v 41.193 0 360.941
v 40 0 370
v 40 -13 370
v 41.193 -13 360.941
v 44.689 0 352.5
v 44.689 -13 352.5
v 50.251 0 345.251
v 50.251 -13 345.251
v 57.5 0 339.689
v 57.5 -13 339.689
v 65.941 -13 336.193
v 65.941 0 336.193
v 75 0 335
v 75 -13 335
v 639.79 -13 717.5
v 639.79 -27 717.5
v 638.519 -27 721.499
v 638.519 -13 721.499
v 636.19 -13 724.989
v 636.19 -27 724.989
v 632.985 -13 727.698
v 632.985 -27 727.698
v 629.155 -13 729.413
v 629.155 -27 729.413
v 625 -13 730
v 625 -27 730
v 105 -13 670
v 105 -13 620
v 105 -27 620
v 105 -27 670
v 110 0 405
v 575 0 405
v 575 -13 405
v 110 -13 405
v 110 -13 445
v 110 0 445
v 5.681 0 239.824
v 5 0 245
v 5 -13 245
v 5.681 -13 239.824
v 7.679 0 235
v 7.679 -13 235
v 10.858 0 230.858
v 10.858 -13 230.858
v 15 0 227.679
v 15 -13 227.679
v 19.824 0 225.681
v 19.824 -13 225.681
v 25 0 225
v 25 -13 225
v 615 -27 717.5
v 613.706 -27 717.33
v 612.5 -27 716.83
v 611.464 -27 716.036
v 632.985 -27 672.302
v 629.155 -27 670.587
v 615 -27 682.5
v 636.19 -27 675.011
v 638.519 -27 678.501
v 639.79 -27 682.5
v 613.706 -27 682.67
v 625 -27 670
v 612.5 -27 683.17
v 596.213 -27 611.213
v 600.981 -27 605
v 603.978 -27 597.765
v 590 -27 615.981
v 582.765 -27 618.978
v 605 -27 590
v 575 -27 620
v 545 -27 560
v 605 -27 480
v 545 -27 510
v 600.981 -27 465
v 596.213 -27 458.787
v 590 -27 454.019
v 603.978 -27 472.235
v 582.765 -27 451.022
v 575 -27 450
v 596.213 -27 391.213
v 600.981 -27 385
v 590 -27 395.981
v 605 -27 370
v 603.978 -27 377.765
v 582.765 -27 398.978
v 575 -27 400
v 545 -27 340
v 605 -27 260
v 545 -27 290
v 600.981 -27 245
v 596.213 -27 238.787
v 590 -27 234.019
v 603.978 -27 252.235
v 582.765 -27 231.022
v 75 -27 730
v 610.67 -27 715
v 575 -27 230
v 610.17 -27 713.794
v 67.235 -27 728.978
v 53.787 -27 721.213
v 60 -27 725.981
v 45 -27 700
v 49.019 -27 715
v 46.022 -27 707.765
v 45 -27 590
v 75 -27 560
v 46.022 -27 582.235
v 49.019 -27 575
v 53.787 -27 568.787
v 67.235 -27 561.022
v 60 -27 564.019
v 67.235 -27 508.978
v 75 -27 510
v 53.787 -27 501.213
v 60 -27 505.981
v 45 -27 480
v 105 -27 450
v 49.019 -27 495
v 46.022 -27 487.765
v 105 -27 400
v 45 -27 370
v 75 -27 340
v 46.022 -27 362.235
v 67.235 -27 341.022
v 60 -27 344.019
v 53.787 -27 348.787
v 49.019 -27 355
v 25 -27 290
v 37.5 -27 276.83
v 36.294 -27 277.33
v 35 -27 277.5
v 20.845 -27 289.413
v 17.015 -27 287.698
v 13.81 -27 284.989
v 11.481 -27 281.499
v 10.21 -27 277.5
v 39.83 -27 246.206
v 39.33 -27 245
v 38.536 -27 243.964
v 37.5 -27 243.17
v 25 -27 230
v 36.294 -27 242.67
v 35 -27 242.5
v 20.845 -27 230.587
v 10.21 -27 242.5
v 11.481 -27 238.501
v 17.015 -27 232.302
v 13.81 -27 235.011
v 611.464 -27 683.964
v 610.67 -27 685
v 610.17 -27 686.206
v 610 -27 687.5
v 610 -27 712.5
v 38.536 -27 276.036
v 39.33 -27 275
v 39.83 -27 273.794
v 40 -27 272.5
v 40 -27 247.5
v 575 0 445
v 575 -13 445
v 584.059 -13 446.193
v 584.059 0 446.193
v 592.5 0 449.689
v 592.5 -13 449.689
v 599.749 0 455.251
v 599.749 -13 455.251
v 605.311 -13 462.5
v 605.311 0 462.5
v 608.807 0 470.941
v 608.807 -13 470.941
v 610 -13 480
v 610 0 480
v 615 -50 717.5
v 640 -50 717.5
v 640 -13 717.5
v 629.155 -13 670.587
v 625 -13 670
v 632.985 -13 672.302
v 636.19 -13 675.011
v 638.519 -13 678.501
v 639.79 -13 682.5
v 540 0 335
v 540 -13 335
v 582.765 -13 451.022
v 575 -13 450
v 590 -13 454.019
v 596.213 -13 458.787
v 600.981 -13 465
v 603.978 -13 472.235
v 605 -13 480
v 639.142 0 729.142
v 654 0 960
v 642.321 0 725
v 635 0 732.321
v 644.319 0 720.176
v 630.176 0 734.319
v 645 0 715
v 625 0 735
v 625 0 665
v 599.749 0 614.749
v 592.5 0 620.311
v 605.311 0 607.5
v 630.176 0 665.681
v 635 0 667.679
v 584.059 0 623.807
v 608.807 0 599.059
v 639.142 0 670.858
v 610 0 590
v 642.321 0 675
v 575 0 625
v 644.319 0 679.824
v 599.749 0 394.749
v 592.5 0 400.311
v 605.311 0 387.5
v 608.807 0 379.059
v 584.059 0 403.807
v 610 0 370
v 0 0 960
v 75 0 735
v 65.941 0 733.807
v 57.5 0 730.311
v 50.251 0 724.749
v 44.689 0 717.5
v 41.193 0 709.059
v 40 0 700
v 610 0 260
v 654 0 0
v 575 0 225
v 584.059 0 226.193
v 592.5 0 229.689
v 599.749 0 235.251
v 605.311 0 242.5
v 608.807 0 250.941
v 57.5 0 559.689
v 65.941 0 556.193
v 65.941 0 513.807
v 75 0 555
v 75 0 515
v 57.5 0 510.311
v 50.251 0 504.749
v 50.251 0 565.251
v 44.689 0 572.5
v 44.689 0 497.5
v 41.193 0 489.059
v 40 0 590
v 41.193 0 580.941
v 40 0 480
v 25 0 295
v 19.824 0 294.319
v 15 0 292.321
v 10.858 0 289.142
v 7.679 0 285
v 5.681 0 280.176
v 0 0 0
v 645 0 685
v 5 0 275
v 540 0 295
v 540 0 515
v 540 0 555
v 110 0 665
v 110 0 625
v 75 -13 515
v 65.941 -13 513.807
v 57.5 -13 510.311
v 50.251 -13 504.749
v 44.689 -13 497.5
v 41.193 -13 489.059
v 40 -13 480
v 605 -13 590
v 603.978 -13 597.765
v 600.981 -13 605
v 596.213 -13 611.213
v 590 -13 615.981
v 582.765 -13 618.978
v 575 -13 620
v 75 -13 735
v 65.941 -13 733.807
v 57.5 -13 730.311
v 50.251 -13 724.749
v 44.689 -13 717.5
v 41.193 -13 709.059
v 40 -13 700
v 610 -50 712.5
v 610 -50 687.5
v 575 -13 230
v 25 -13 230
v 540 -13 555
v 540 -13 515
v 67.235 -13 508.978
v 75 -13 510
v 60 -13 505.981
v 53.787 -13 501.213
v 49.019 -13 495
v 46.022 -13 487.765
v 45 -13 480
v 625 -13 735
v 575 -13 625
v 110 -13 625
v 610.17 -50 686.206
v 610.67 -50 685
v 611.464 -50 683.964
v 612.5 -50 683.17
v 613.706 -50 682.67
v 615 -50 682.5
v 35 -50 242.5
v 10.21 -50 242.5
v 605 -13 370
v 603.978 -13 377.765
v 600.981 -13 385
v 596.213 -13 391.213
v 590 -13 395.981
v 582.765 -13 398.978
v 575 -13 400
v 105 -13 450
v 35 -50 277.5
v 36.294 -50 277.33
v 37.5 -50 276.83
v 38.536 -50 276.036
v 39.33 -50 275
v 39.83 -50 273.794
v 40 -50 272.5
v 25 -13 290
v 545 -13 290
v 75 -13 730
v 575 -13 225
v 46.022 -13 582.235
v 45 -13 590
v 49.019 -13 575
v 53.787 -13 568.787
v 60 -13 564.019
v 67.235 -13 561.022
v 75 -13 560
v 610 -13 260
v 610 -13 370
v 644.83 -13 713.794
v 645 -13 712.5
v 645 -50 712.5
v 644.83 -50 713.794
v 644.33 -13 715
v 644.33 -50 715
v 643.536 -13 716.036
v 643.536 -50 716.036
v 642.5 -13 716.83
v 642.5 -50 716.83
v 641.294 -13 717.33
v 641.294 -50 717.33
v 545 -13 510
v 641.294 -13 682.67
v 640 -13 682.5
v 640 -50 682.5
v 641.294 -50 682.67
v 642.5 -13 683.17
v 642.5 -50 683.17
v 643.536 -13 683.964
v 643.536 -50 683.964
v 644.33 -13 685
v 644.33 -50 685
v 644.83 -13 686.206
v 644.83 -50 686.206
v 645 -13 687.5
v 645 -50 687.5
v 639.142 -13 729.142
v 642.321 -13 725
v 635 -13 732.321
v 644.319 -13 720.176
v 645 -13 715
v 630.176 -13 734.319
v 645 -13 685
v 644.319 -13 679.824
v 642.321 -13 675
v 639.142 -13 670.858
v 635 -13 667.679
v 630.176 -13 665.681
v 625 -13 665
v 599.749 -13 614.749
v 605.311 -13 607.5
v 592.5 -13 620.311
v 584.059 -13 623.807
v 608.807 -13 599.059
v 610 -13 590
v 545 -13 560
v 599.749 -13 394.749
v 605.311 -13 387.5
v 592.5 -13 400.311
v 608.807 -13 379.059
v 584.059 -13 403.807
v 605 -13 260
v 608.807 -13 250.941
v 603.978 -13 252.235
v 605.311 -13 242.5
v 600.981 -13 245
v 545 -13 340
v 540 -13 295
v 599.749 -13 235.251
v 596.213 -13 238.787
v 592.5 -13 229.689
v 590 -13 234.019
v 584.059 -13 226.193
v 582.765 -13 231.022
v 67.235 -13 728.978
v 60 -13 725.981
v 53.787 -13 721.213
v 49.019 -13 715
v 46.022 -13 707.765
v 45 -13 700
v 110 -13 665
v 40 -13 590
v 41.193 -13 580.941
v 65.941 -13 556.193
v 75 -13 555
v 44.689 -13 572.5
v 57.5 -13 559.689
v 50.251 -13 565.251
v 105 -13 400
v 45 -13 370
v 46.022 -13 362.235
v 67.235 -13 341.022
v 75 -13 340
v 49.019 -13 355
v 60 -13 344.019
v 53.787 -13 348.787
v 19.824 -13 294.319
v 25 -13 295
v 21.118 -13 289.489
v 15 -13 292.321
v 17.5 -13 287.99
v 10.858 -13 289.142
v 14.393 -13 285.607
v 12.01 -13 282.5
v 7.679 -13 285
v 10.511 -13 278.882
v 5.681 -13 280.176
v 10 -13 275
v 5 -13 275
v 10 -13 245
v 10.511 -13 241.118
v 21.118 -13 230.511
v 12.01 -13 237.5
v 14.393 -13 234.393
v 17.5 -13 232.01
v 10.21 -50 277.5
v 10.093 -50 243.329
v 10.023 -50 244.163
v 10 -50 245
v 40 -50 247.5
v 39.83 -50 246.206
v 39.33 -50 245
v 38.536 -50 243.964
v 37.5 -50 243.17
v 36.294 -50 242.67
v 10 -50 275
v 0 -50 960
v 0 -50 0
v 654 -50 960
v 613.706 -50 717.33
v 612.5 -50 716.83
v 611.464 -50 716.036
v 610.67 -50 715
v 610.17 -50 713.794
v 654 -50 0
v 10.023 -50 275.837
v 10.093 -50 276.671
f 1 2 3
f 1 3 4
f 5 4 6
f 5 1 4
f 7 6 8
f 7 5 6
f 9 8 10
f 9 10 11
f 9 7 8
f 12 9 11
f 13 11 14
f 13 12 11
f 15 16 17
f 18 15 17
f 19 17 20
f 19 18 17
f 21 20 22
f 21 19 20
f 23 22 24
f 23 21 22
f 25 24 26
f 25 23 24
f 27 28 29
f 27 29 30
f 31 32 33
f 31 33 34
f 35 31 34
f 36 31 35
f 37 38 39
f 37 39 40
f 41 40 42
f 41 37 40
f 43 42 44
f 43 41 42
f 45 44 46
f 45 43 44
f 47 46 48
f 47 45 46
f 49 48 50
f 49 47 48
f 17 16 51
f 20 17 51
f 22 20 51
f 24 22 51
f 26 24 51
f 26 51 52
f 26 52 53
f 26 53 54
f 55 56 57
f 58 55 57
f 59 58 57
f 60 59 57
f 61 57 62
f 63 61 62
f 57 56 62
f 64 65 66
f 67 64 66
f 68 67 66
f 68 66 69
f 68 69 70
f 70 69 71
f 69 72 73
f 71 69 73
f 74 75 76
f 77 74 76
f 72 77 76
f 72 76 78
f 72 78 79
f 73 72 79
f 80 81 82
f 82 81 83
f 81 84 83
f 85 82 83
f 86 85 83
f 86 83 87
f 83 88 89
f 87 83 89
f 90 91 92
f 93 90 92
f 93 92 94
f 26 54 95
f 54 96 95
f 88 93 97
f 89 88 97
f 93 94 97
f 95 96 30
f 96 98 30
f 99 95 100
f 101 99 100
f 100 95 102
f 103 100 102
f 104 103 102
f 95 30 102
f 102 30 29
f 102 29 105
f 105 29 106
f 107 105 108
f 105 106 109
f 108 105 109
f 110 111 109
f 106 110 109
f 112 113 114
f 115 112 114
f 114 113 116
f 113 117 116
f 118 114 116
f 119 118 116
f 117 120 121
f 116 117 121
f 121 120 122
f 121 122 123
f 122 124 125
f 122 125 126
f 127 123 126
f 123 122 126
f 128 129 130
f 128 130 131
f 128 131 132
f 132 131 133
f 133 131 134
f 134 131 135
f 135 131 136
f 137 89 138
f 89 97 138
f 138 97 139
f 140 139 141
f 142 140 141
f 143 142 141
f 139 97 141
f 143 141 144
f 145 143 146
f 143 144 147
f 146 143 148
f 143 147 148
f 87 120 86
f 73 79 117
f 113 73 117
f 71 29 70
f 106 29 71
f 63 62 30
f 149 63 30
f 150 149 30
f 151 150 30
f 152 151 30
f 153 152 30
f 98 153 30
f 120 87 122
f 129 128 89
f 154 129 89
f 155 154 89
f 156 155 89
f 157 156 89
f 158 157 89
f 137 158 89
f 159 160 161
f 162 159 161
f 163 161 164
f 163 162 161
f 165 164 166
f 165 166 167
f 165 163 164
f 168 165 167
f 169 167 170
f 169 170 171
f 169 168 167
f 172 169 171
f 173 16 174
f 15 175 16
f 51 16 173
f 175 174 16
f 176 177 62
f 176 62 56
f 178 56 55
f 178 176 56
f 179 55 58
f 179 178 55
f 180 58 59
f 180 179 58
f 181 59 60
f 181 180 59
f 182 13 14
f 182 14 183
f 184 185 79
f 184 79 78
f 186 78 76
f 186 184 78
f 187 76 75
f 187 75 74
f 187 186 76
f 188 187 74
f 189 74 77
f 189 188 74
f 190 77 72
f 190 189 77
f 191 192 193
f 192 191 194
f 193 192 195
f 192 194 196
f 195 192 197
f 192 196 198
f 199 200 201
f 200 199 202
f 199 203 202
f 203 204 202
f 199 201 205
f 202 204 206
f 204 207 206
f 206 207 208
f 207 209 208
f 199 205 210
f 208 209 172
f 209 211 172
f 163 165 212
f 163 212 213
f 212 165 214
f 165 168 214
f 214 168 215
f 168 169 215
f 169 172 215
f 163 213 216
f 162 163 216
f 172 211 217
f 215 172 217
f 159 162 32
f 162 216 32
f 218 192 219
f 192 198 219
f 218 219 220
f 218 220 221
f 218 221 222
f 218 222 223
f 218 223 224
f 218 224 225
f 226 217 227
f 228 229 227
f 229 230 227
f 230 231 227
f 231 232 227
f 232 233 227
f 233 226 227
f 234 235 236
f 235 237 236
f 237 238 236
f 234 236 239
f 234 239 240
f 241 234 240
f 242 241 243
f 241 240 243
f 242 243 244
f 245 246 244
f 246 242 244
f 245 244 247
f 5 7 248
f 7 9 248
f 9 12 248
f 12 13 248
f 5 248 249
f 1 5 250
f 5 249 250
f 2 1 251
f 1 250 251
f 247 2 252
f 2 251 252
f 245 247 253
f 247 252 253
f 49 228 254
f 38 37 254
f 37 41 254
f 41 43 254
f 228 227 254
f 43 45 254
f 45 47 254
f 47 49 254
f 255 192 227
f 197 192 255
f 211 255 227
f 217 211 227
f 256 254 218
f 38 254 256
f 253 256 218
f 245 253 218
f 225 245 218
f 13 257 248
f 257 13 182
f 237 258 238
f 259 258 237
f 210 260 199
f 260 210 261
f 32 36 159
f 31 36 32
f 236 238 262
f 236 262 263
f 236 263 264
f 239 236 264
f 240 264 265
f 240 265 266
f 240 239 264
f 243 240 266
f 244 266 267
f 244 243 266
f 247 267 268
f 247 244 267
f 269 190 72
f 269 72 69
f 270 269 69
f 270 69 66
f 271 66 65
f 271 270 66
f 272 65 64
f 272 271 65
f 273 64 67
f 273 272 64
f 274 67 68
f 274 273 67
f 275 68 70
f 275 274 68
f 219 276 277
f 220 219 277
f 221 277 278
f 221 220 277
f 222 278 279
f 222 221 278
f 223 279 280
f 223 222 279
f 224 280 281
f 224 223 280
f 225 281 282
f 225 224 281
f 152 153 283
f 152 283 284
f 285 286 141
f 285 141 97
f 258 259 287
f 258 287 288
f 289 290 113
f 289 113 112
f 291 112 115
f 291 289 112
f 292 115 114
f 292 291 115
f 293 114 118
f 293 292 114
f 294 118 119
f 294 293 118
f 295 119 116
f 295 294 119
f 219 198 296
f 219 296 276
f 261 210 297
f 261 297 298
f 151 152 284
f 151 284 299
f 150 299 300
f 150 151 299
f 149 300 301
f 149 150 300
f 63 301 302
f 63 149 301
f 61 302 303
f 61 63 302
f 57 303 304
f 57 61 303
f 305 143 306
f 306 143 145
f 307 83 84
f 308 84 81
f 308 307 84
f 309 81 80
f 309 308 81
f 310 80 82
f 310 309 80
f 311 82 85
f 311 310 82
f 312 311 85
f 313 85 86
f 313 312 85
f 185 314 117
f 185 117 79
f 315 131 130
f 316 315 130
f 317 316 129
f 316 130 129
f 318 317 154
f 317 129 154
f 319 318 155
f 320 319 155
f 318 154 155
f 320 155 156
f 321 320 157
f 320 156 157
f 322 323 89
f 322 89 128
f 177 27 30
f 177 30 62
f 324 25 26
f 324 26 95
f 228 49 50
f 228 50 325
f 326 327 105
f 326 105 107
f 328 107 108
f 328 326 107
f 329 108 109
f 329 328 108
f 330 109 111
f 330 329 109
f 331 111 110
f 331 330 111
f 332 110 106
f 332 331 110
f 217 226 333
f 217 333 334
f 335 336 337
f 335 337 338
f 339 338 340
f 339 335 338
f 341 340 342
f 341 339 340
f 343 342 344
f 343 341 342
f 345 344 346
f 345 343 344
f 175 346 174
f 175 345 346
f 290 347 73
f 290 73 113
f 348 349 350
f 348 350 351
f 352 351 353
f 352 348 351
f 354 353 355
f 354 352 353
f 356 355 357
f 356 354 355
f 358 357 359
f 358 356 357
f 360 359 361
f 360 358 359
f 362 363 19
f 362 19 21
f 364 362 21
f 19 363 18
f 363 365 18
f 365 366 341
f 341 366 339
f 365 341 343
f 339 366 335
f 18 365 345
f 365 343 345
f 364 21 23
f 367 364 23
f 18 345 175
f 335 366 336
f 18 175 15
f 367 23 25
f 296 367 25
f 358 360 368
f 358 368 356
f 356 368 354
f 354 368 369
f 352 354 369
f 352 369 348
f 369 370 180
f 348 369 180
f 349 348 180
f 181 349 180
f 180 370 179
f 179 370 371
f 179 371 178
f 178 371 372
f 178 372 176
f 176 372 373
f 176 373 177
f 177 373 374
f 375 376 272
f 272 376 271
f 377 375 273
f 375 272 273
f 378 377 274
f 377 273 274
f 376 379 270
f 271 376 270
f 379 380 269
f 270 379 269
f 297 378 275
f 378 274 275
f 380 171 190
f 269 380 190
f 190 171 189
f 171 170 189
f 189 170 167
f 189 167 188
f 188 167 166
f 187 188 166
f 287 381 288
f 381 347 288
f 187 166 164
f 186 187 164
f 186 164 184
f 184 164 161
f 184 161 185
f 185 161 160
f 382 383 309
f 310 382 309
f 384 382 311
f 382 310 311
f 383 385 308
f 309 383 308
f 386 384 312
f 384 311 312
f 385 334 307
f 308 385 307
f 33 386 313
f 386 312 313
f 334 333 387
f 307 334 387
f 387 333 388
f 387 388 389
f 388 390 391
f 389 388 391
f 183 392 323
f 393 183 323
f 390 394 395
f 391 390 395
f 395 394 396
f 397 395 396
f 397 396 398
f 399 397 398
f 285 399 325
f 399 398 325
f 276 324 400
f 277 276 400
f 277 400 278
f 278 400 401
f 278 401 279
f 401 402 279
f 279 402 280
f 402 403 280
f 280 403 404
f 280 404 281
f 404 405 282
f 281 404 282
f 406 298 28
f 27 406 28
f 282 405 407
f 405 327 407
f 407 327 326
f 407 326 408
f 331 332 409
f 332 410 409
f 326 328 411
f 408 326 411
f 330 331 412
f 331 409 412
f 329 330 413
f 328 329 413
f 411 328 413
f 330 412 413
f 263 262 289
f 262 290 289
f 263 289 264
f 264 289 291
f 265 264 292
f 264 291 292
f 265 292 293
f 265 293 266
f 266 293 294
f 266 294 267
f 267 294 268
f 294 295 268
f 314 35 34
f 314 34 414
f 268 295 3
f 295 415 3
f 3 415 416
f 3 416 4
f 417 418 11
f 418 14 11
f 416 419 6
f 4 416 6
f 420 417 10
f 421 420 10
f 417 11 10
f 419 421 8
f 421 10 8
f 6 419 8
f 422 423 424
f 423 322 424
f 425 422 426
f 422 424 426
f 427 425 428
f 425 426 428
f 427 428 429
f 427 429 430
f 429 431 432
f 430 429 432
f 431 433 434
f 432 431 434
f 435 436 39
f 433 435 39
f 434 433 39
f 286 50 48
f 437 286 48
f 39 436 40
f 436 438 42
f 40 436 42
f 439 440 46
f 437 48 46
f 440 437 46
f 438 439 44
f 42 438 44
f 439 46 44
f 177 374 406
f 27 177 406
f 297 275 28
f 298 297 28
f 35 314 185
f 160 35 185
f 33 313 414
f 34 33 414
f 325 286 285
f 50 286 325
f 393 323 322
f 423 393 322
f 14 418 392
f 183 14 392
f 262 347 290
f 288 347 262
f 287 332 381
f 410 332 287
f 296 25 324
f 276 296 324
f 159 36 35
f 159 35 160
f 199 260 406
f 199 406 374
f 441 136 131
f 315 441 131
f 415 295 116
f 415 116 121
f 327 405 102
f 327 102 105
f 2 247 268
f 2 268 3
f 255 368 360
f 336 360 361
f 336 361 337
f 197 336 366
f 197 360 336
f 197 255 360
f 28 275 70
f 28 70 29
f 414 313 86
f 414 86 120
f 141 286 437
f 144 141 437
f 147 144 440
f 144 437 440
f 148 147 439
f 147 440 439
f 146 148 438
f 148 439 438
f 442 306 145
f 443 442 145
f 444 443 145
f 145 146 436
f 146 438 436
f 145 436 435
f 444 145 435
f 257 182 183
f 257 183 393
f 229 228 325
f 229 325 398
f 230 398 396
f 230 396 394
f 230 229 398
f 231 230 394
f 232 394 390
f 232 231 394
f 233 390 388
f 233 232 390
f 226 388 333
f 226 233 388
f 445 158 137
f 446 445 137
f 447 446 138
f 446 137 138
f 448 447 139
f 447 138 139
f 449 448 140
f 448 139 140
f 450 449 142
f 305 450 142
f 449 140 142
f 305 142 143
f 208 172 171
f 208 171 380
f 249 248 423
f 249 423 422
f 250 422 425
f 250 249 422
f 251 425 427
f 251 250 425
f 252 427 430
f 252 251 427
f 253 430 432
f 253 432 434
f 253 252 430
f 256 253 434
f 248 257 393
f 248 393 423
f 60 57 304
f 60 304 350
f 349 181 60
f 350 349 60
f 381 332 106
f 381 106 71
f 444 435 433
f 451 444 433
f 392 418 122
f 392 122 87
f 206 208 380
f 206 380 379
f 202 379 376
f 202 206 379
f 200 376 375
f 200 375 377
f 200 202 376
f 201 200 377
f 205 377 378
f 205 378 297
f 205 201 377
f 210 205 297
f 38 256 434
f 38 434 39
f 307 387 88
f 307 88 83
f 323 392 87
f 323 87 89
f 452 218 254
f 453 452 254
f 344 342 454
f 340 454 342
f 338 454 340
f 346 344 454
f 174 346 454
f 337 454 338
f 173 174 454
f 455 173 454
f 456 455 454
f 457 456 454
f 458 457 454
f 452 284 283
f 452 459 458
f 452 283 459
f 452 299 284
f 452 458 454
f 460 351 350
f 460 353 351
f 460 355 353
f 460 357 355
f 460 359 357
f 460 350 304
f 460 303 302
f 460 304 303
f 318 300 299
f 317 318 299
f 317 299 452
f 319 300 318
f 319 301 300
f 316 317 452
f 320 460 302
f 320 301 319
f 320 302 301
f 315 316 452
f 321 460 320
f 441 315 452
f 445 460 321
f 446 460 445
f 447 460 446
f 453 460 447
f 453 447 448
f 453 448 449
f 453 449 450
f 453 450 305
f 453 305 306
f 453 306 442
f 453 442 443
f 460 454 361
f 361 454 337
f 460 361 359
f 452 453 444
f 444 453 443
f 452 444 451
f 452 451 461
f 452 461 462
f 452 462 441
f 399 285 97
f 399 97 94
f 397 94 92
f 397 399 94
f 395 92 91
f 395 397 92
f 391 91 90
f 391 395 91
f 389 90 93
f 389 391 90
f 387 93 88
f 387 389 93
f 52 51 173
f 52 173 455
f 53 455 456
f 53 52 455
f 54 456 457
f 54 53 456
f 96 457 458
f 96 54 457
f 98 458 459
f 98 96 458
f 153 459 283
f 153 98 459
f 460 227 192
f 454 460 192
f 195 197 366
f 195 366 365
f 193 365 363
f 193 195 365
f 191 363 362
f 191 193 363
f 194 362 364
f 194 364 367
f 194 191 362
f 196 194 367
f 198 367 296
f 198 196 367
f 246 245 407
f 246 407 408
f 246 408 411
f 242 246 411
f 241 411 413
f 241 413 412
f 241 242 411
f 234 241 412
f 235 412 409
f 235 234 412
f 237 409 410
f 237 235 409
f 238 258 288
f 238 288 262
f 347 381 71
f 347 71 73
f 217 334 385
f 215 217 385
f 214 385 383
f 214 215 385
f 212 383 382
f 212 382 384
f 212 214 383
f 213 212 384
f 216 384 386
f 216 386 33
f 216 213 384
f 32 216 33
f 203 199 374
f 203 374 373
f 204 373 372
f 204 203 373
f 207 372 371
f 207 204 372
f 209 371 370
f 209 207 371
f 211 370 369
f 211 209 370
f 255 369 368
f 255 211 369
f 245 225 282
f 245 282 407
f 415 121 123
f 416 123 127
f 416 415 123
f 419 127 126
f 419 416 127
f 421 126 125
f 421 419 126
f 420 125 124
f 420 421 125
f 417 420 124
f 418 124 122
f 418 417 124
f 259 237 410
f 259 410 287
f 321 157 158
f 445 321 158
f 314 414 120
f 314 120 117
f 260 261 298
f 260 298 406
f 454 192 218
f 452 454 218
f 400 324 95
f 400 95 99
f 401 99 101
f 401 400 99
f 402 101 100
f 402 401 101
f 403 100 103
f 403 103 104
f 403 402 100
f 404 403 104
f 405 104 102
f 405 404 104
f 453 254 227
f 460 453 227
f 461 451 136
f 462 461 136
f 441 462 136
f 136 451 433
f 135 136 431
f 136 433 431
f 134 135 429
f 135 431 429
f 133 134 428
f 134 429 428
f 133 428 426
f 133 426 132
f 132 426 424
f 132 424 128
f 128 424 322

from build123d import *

# Parameters (mm, degrees)
EXTRUDE_1_DEPTH     = 50
CUT_EXTRUDE_1_DEPTH = 13
CUT_EXTRUDE_2_DEPTH = 27
CUT_EXTRUDE_3_DEPTH = 50


with BuildPart() as part:
    # 草图1 → 凸台-拉伸1 (new body)
    with BuildSketch(Plane(origin=(0, 0, 0), x_dir=(1, 0, 0), z_dir=(0, 1, 0))):
        Polygon((0, 0), (654, 0), (654.0000000000001, -960), (1.1757e-13, -960), align=None)
    extrude(amount=-EXTRUDE_1_DEPTH)

    # 草图1<4> → 切除-拉伸1 (cut)
    with BuildSketch(Plane(origin=(0, 0, 0), x_dir=(1, 0, 0), z_dir=(0, 1, 0))):
        with BuildLine():
            Line((5.0000000000000355, -275), (5.0000000000000355, -244.9999999999999))
            ThreePointArc((5.0000000000000355, -244.9999999999999), (10.857864376269086, -230.85786437626894), (25.000000000000036, -224.99999999999986))
            Line((25.000000000000036, -224.99999999999986), (574.9999999999997, -224.99999999999986))
            ThreePointArc((574.9999999999997, -224.99999999999986), (599.748737341529, -235.2512626584707), (609.9999999999999, -260.0000000000001))
            Line((609.9999999999999, -260.0000000000001), (609.9999999999999, -369.9999999999998))
            ThreePointArc((609.9999999999999, -369.9999999999998), (599.748737341529, -394.7487373415292), (574.9999999999997, -405))
            Line((574.9999999999997, -405), (110.0000000000001, -405.00000000000006))
            Line((110.0000000000001, -405.00000000000006), (110.00000000000007, -444.9999999999999))
            Line((110.00000000000007, -444.9999999999999), (574.9999999999998, -444.99999999999966))
            ThreePointArc((574.9999999999998, -444.99999999999966), (599.7487373415292, -455.2512626584705), (610, -479.99999999999994))
            Line((610, -479.99999999999994), (610, -589.9999999999995))
            ThreePointArc((610, -589.9999999999995), (599.7487373415291, -614.7487373415289), (574.9999999999998, -624.9999999999998))
            Line((574.9999999999998, -624.9999999999998), (110.0000000000001, -625))
            Line((110.0000000000001, -625), (110.00000000000011, -665.0000000000001))
            Line((110.00000000000011, -665.0000000000001), (625.0000000000001, -665.0000000000002))
            ThreePointArc((625.0000000000001, -665.0000000000002), (639.142135623731, -670.8578643762693), (645.0000000000001, -685.0000000000001))
            Line((645.0000000000001, -685.0000000000001), (645.0000000000001, -714.9999999999998))
            ThreePointArc((645.0000000000001, -714.9999999999998), (639.1421356237311, -729.1421356237307), (625.0000000000001, -734.9999999999997))
            Line((625.0000000000001, -734.9999999999997), (75.0000000000004, -734.9999999999999))
            ThreePointArc((75.0000000000004, -734.9999999999999), (50.25126265847098, -724.748737341529), (40.000000000000135, -699.9999999999997))
            Line((40.000000000000135, -699.9999999999997), (40.0000000000001, -590.0000000000001))
            ThreePointArc((40.0000000000001, -590.0000000000001), (50.25126265847094, -565.2512626584708), (75.00000000000034, -554.9999999999998))
            Line((75.00000000000034, -554.9999999999998), (539.9999999999999, -554.9999999999998))
            Line((539.9999999999999, -554.9999999999998), (539.9999999999999, -514.9999999999997))
            Line((539.9999999999999, -514.9999999999997), (75.00000000000036, -515))
            ThreePointArc((75.00000000000036, -515), (50.251262658470964, -504.7487373415292), (40.000000000000085, -479.9999999999998))
            Line((40.000000000000085, -479.9999999999998), (40.00000000000005, -370.0000000000004))
            ThreePointArc((40.00000000000005, -370.0000000000004), (50.25126265847087, -345.251262658471), (75.00000000000028, -335.0000000000001))
            Line((75.00000000000028, -335.0000000000001), (540, -335))
            Line((540, -335), (540, -295.00000000000006))
            Line((540, -295.00000000000006), (25.000000000000036, -295.00000000000006))
            ThreePointArc((25.000000000000036, -295.00000000000006), (10.857864376269081, -289.14213562373095), (5.0000000000000355, -275))
        make_face()
    extrude(amount=-CUT_EXTRUDE_1_DEPTH, mode=Mode.SUBTRACT)

    # 草图1<5> → 切除-拉伸2 (cut)
    with BuildSketch(Plane(origin=(0, 0, 0), x_dir=(1, 0, 0), z_dir=(0, 1, 0))):
        with BuildLine():
            Line((25.00000000000002, -229.99999999999986), (574.9999999999999, -229.99999999999983))
            ThreePointArc((574.9999999999999, -229.99999999999983), (596.2132034355964, -238.78679656440343), (604.9999999999999, -259.9999999999999))
            Line((604.9999999999999, -259.9999999999999), (604.9999999999999, -370))
            ThreePointArc((604.9999999999999, -370), (596.2132034355964, -391.2132034355964), (574.9999999999999, -400))
            Line((574.9999999999999, -400), (105.00000000000007, -400.00000000000006))
            Line((105.00000000000007, -400.00000000000006), (105.00000000000007, -449.9999999999999))
            Line((105.00000000000007, -449.9999999999999), (575, -449.99999999999966))
            ThreePointArc((575, -449.99999999999966), (596.2132034355964, -458.78679656440323), (605, -479.99999999999966))
            Line((605, -479.99999999999966), (605, -589.9999999999998))
            ThreePointArc((605, -589.9999999999998), (596.2132034355964, -611.2132034355961), (575, -619.9999999999998))
            Line((575, -619.9999999999998), (105.00000000000011, -620))
            Line((105.00000000000011, -620), (105.00000000000011, -670.0000000000001))
            Line((105.00000000000011, -670.0000000000001), (625, -670.0000000000001))
            ThreePointArc((625, -670.0000000000001), (635.6066017177983, -674.3933982822019), (640.0000000000001, -685.0000000000002))
            Line((640.0000000000001, -685.0000000000002), (640.0000000000001, -714.9999999999997))
            ThreePointArc((640.0000000000001, -714.9999999999997), (635.6066017177983, -725.606601717798), (625, -729.9999999999998))
            Line((625, -729.9999999999998), (75.00000000000007, -730))
            ThreePointArc((75.00000000000007, -730), (53.786796564403645, -721.2132034355964), (45.00000000000012, -700))
            Line((45.00000000000012, -700), (45.00000000000009, -589.9999999999999))
            ThreePointArc((45.00000000000009, -589.9999999999999), (53.78679656440367, -568.7867965644034), (75.00000000000009, -559.9999999999999))
            Line((75.00000000000009, -559.9999999999999), (544.9999999999999, -559.9999999999998))
            Line((544.9999999999999, -559.9999999999998), (544.9999999999999, -509.99999999999966))
            Line((544.9999999999999, -509.99999999999966), (75.00000000000009, -510))
            ThreePointArc((75.00000000000009, -510), (53.786796564403616, -501.2132034355964), (45.00000000000007, -479.99999999999994))
            Line((45.00000000000007, -479.99999999999994), (45.00000000000004, -370.0000000000001))
            ThreePointArc((45.00000000000004, -370.0000000000001), (53.786796564403616, -348.7867965644037), (75.00000000000003, -340.00000000000006))
            Line((75.00000000000003, -340.00000000000006), (545, -340))
            Line((545, -340), (545, -290.00000000000006))
            Line((545, -290.00000000000006), (25.00000000000002, -290.00000000000006))
            ThreePointArc((25.00000000000002, -290.00000000000006), (14.393398282201769, -285.60660171779824), (10.000000000000036, -275))
            Line((10.000000000000036, -275), (10.000000000000036, -244.9999999999999))
            ThreePointArc((10.000000000000036, -244.9999999999999), (14.393398282201789, -234.39339828220164), (25.00000000000002, -229.99999999999986))
        make_face()
    extrude(amount=-CUT_EXTRUDE_2_DEPTH, mode=Mode.SUBTRACT)

    # 草图1<6> → 切除-拉伸3 (cut)
    with BuildSketch(Plane(origin=(0, 0, 0), x_dir=(1, 0, 0), z_dir=(0, 1, 0))):
        with BuildLine():
            ThreePointArc((10.000000000000018, -275), (10.052542158175607, -276.2543939041952), (10.20980054225095, -277.4999999999999))
            Line((10.20980054225095, -277.49999999999994), (35.00000000000021, -277.49999999999994))
            ThreePointArc((35.00000000000021, -277.49999999999994), (38.53553390593298, -276.03553390593265), (40.000000000000256, -272.4999999999999))
            Line((40.00000000000024, -272.4999999999999), (40.00000000000024, -247.5))
            ThreePointArc((40.00000000000024, -247.5), (38.53553390593298, -243.96446609406723), (35.00000000000021, -242.49999999999997))
            Line((35.00000000000021, -242.49999999999997), (10.209800542250957, -242.49999999999997))
            ThreePointArc((10.209800542250964, -242.5), (10.052542158175624, -243.7456060958047), (10.000000000000037, -244.9999999999999))
            Line((10.000000000000036, -244.9999999999999), (10.000000000000036, -275))
        make_face()
        with BuildLine():
            ThreePointArc((640.0000000000002, -717.5), (643.535533905933, -716.0355339059328), (645.0000000000002, -712.5))
            Line((645.0000000000001, -712.5), (645.0000000000001, -687.5))
            ThreePointArc((645.0000000000002, -687.5), (643.535533905933, -683.9644660940672), (640.0000000000002, -682.5))
            Line((640.0000000000002, -682.5), (615.0000000000002, -682.5))
            ThreePointArc((615.0000000000002, -682.5), (611.4644660940675, -683.9644660940672), (610.0000000000002, -687.5))
            Line((610.0000000000002, -687.5), (610.0000000000002, -712.5))
            ThreePointArc((610.0000000000002, -712.5), (611.4644660940675, -716.0355339059328), (615.0000000000002, -717.5))
            Line((615.0000000000002, -717.5), (640.0000000000002, -717.5))
        make_face()
    extrude(amount=-CUT_EXTRUDE_3_DEPTH, mode=Mode.SUBTRACT)


solid = part.part
